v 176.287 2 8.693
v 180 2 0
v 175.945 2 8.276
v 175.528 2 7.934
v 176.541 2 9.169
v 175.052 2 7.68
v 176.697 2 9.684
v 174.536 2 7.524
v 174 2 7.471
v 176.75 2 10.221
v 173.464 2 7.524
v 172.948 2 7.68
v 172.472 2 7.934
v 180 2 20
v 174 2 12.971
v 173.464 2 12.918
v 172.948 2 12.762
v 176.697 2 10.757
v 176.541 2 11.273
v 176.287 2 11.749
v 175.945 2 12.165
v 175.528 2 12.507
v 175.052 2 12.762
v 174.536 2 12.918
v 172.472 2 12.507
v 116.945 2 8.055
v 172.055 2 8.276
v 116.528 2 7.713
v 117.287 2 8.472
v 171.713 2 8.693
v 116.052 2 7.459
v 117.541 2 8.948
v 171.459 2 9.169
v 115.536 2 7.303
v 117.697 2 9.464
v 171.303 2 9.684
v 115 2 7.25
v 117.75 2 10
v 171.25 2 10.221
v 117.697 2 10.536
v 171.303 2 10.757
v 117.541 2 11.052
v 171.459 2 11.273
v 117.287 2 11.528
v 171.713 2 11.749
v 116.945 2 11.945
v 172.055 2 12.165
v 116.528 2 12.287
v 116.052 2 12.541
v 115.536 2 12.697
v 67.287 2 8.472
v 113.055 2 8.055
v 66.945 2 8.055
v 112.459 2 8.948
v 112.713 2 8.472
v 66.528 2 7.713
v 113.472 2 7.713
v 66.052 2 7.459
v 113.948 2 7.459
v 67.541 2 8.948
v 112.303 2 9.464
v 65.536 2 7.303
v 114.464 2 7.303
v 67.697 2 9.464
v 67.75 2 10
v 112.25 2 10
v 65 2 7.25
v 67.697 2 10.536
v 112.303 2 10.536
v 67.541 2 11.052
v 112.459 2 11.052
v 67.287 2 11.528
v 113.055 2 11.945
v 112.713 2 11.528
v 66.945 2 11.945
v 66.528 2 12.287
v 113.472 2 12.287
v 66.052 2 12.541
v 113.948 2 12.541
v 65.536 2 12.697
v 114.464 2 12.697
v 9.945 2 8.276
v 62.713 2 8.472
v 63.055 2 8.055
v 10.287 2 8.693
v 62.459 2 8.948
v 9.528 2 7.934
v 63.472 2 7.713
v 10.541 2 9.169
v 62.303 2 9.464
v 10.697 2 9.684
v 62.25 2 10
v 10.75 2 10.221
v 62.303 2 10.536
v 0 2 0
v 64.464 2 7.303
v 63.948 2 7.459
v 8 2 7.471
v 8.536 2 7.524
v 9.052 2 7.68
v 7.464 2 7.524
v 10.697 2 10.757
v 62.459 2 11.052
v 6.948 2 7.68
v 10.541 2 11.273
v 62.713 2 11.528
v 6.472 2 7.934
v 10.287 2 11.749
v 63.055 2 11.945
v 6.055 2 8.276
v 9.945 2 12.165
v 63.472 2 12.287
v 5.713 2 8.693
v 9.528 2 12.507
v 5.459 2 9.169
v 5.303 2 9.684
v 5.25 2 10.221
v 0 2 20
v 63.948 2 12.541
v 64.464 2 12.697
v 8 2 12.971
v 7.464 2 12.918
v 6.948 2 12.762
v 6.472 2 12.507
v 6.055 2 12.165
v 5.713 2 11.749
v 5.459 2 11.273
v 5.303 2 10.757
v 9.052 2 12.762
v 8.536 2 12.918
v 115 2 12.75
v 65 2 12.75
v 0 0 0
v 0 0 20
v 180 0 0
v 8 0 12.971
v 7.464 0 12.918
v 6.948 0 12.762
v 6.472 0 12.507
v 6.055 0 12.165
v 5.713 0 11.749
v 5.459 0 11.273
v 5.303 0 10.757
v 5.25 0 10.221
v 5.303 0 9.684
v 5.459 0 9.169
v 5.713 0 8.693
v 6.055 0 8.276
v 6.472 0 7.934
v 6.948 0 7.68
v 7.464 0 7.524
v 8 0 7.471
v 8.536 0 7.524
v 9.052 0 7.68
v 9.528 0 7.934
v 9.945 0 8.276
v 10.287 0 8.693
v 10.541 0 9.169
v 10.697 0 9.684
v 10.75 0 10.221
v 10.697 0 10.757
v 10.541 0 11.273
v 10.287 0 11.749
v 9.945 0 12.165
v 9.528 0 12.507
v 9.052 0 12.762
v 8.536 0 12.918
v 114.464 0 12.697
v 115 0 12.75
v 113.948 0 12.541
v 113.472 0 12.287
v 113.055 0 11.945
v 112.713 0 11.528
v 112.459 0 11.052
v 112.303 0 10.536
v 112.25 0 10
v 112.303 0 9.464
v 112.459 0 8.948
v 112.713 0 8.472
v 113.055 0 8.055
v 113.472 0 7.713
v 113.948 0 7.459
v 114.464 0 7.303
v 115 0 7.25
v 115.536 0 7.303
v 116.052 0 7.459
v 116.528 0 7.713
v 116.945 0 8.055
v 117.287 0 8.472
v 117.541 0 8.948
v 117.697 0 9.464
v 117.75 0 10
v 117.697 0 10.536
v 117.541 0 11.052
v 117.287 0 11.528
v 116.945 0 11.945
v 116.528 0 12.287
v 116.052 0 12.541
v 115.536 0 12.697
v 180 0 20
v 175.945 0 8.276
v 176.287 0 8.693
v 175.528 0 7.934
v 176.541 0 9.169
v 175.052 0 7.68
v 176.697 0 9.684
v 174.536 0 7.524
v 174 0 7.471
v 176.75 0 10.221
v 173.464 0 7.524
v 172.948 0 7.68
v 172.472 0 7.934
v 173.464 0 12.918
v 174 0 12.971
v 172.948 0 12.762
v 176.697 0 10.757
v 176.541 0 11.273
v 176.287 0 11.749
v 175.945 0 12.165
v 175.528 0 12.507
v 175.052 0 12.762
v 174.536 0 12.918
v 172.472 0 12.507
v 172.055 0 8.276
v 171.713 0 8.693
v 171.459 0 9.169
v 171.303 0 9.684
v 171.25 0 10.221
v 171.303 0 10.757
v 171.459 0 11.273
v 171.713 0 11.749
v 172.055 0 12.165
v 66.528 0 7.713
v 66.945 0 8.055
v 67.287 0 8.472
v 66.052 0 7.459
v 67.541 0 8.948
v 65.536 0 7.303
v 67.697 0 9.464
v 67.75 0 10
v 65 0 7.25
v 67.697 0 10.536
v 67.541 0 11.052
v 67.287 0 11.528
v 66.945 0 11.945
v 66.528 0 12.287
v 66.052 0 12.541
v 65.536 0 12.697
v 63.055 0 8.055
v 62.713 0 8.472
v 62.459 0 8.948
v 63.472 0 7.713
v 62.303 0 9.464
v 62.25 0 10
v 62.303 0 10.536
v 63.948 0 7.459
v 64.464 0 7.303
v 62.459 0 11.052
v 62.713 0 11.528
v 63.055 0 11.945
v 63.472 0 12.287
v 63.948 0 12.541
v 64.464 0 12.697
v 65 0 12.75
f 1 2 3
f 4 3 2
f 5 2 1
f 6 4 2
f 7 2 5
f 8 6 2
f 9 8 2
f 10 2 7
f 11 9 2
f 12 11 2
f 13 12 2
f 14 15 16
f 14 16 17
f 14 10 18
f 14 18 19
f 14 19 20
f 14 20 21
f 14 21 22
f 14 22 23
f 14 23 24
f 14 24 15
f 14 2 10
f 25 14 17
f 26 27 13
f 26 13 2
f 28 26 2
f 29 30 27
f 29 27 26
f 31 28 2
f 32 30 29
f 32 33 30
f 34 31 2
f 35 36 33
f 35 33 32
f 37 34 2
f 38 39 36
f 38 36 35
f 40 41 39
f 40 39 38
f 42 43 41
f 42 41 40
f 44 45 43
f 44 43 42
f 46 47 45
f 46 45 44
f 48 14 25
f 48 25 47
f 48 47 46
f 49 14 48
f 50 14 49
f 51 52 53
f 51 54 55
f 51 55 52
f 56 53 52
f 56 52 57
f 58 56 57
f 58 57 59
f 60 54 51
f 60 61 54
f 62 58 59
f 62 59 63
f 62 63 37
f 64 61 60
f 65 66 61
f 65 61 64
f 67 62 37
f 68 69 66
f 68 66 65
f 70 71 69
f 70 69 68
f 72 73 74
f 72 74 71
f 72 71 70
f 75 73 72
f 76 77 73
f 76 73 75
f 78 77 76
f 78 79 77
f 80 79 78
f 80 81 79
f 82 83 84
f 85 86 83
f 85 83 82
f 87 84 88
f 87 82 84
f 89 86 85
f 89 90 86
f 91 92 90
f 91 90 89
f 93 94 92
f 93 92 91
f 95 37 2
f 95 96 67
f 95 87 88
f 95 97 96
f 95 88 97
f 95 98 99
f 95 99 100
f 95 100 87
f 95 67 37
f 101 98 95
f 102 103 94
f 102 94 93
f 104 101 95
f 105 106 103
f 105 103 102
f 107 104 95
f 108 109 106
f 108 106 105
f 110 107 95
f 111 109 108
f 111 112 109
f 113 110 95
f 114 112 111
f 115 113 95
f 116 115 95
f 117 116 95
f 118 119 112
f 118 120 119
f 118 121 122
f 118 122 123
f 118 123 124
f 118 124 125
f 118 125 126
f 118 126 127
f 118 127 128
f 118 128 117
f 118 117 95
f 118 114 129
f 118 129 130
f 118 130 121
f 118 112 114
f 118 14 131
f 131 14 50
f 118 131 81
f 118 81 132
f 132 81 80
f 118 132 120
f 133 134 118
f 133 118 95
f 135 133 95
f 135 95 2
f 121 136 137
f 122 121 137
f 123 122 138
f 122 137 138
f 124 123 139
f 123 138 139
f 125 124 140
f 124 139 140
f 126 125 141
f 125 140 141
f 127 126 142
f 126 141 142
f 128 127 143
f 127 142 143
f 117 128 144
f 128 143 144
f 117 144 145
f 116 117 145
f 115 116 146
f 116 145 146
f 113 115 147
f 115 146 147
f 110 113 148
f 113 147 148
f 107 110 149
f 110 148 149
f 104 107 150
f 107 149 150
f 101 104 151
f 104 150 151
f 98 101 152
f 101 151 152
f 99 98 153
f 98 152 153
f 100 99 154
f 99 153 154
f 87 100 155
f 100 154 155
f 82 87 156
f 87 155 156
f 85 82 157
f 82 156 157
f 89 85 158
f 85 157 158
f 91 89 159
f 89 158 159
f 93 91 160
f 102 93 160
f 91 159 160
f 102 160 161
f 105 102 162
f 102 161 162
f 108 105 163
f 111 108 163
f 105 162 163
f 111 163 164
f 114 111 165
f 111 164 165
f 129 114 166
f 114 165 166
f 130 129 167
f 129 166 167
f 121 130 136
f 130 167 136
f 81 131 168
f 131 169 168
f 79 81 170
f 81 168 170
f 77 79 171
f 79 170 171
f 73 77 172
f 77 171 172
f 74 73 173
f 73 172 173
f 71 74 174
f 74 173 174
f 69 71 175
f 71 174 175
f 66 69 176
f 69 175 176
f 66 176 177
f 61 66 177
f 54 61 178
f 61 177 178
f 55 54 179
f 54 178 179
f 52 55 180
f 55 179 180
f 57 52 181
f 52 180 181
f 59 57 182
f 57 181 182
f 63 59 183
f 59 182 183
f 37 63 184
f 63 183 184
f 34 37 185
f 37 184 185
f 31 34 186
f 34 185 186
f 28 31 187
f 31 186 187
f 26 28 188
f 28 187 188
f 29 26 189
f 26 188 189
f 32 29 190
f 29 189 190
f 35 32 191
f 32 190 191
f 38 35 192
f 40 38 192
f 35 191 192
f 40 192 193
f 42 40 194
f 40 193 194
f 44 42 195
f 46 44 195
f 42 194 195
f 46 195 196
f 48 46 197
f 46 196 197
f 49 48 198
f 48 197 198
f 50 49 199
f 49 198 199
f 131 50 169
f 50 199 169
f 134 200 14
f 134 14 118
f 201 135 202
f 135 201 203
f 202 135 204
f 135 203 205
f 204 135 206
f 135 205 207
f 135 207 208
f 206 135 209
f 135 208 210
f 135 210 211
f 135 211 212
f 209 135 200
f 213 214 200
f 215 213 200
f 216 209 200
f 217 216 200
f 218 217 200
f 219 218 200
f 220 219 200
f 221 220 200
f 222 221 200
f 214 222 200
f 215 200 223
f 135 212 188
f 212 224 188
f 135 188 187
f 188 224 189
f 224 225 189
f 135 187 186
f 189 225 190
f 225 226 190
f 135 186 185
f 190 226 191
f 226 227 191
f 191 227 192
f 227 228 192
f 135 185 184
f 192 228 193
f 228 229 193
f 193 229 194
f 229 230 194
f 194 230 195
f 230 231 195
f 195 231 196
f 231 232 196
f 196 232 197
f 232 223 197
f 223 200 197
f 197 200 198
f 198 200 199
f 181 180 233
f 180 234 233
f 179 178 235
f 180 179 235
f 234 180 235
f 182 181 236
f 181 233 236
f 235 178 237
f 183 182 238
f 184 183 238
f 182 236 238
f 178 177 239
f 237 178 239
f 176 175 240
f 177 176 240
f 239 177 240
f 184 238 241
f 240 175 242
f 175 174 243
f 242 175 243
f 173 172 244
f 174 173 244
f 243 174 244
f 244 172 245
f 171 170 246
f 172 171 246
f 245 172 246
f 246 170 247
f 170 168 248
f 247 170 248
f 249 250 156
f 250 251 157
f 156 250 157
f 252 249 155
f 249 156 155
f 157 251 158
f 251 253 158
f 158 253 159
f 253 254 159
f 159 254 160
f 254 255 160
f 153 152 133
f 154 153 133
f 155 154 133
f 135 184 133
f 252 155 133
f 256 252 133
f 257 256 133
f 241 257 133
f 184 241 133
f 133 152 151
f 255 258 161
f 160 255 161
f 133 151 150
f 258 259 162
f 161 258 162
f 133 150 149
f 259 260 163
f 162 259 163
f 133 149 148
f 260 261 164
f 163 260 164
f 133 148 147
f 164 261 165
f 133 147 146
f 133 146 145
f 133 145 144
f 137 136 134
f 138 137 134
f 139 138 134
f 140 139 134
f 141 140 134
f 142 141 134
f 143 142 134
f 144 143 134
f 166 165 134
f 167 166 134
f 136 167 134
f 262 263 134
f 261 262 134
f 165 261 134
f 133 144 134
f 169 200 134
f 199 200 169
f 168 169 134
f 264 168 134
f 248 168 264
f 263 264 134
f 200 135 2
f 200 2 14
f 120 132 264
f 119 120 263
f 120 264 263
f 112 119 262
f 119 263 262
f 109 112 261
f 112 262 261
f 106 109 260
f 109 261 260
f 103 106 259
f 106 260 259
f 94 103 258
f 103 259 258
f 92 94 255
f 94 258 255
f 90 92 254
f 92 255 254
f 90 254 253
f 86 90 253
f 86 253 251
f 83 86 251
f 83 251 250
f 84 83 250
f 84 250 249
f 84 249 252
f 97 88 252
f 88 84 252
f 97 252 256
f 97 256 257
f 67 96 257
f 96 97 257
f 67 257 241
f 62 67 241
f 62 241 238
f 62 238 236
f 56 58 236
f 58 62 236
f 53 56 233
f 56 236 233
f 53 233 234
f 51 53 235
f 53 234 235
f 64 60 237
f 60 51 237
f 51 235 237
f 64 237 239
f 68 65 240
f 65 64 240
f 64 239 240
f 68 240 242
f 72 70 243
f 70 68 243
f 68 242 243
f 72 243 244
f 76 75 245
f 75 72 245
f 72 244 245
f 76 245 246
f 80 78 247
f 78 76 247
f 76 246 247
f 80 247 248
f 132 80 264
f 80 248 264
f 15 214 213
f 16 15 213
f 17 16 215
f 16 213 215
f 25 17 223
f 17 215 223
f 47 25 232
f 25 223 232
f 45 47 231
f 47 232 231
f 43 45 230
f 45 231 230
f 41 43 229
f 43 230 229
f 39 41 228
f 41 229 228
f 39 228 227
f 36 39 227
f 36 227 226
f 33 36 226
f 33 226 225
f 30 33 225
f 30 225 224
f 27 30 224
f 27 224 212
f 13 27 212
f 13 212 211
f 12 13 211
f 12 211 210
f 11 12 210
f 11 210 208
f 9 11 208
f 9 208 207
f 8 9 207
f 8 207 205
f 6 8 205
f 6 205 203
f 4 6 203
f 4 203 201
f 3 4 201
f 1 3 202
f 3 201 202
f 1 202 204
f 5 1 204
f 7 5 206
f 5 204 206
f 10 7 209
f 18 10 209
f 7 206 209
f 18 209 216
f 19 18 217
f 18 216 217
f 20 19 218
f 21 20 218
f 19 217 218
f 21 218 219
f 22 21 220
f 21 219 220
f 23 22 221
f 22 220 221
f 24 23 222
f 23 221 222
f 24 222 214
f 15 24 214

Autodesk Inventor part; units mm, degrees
ref_plane "XZ Plane" through (0, 0, 0) normal (0, 1, 0) x (-1, 0, 0)
ref_plane "XY Plane" through (0, 0, 0) normal (0, 0, 1) x (1, 0, 0)
sketch "Sketch1" plane through (0, 0, 0) normal (0, 1, 0) x (-1, 0, 0)
  line L0 (0, 0) -> (-180, 0)
  line L1 (-180, 0) -> (-180, 20)
  line L2 (-180, 20) -> (0, 20)
  line L3 (0, 20) -> (0, 0)
  dimension "d0" = 180
  dimension "d1" = 20
extrude "Extrusion1" add sketch "Sketch1" along normal blind 2
hole "Hole1" at (8, 2, 10.2209) direction (0, -1, 0) diameter 5.5 end through all
pattern_linear "Rectangular Pattern1" count 2 spacing 166 along (1, 0, 0) of "Hole1"
sketch "Sketch2" plane through (0, 2, 0) normal (0, 1, 0) x (1, 0, 0)
  line L0 (0, -20) -> (180, -20) projected
  line L1 (90, -20) -> (90, 0) construction
  line L2 (90, -10) -> (115, -10) construction
  point P0 (0, 0)
  dimension "d16" = 25
hole "Hole2" at (115, 2, 10) direction (0, -1, 0) diameter 5.5 end through all
ref_plane "Work Plane1" through (90, 0, 0) normal (1, 0, 0) x (0, 1, 0)
mirror "Mirror1" about plane through (90, 0, 0) normal (1, 0, 0) of "Hole2"
properties part number "flat bar1" material "Aluminum 6061"
